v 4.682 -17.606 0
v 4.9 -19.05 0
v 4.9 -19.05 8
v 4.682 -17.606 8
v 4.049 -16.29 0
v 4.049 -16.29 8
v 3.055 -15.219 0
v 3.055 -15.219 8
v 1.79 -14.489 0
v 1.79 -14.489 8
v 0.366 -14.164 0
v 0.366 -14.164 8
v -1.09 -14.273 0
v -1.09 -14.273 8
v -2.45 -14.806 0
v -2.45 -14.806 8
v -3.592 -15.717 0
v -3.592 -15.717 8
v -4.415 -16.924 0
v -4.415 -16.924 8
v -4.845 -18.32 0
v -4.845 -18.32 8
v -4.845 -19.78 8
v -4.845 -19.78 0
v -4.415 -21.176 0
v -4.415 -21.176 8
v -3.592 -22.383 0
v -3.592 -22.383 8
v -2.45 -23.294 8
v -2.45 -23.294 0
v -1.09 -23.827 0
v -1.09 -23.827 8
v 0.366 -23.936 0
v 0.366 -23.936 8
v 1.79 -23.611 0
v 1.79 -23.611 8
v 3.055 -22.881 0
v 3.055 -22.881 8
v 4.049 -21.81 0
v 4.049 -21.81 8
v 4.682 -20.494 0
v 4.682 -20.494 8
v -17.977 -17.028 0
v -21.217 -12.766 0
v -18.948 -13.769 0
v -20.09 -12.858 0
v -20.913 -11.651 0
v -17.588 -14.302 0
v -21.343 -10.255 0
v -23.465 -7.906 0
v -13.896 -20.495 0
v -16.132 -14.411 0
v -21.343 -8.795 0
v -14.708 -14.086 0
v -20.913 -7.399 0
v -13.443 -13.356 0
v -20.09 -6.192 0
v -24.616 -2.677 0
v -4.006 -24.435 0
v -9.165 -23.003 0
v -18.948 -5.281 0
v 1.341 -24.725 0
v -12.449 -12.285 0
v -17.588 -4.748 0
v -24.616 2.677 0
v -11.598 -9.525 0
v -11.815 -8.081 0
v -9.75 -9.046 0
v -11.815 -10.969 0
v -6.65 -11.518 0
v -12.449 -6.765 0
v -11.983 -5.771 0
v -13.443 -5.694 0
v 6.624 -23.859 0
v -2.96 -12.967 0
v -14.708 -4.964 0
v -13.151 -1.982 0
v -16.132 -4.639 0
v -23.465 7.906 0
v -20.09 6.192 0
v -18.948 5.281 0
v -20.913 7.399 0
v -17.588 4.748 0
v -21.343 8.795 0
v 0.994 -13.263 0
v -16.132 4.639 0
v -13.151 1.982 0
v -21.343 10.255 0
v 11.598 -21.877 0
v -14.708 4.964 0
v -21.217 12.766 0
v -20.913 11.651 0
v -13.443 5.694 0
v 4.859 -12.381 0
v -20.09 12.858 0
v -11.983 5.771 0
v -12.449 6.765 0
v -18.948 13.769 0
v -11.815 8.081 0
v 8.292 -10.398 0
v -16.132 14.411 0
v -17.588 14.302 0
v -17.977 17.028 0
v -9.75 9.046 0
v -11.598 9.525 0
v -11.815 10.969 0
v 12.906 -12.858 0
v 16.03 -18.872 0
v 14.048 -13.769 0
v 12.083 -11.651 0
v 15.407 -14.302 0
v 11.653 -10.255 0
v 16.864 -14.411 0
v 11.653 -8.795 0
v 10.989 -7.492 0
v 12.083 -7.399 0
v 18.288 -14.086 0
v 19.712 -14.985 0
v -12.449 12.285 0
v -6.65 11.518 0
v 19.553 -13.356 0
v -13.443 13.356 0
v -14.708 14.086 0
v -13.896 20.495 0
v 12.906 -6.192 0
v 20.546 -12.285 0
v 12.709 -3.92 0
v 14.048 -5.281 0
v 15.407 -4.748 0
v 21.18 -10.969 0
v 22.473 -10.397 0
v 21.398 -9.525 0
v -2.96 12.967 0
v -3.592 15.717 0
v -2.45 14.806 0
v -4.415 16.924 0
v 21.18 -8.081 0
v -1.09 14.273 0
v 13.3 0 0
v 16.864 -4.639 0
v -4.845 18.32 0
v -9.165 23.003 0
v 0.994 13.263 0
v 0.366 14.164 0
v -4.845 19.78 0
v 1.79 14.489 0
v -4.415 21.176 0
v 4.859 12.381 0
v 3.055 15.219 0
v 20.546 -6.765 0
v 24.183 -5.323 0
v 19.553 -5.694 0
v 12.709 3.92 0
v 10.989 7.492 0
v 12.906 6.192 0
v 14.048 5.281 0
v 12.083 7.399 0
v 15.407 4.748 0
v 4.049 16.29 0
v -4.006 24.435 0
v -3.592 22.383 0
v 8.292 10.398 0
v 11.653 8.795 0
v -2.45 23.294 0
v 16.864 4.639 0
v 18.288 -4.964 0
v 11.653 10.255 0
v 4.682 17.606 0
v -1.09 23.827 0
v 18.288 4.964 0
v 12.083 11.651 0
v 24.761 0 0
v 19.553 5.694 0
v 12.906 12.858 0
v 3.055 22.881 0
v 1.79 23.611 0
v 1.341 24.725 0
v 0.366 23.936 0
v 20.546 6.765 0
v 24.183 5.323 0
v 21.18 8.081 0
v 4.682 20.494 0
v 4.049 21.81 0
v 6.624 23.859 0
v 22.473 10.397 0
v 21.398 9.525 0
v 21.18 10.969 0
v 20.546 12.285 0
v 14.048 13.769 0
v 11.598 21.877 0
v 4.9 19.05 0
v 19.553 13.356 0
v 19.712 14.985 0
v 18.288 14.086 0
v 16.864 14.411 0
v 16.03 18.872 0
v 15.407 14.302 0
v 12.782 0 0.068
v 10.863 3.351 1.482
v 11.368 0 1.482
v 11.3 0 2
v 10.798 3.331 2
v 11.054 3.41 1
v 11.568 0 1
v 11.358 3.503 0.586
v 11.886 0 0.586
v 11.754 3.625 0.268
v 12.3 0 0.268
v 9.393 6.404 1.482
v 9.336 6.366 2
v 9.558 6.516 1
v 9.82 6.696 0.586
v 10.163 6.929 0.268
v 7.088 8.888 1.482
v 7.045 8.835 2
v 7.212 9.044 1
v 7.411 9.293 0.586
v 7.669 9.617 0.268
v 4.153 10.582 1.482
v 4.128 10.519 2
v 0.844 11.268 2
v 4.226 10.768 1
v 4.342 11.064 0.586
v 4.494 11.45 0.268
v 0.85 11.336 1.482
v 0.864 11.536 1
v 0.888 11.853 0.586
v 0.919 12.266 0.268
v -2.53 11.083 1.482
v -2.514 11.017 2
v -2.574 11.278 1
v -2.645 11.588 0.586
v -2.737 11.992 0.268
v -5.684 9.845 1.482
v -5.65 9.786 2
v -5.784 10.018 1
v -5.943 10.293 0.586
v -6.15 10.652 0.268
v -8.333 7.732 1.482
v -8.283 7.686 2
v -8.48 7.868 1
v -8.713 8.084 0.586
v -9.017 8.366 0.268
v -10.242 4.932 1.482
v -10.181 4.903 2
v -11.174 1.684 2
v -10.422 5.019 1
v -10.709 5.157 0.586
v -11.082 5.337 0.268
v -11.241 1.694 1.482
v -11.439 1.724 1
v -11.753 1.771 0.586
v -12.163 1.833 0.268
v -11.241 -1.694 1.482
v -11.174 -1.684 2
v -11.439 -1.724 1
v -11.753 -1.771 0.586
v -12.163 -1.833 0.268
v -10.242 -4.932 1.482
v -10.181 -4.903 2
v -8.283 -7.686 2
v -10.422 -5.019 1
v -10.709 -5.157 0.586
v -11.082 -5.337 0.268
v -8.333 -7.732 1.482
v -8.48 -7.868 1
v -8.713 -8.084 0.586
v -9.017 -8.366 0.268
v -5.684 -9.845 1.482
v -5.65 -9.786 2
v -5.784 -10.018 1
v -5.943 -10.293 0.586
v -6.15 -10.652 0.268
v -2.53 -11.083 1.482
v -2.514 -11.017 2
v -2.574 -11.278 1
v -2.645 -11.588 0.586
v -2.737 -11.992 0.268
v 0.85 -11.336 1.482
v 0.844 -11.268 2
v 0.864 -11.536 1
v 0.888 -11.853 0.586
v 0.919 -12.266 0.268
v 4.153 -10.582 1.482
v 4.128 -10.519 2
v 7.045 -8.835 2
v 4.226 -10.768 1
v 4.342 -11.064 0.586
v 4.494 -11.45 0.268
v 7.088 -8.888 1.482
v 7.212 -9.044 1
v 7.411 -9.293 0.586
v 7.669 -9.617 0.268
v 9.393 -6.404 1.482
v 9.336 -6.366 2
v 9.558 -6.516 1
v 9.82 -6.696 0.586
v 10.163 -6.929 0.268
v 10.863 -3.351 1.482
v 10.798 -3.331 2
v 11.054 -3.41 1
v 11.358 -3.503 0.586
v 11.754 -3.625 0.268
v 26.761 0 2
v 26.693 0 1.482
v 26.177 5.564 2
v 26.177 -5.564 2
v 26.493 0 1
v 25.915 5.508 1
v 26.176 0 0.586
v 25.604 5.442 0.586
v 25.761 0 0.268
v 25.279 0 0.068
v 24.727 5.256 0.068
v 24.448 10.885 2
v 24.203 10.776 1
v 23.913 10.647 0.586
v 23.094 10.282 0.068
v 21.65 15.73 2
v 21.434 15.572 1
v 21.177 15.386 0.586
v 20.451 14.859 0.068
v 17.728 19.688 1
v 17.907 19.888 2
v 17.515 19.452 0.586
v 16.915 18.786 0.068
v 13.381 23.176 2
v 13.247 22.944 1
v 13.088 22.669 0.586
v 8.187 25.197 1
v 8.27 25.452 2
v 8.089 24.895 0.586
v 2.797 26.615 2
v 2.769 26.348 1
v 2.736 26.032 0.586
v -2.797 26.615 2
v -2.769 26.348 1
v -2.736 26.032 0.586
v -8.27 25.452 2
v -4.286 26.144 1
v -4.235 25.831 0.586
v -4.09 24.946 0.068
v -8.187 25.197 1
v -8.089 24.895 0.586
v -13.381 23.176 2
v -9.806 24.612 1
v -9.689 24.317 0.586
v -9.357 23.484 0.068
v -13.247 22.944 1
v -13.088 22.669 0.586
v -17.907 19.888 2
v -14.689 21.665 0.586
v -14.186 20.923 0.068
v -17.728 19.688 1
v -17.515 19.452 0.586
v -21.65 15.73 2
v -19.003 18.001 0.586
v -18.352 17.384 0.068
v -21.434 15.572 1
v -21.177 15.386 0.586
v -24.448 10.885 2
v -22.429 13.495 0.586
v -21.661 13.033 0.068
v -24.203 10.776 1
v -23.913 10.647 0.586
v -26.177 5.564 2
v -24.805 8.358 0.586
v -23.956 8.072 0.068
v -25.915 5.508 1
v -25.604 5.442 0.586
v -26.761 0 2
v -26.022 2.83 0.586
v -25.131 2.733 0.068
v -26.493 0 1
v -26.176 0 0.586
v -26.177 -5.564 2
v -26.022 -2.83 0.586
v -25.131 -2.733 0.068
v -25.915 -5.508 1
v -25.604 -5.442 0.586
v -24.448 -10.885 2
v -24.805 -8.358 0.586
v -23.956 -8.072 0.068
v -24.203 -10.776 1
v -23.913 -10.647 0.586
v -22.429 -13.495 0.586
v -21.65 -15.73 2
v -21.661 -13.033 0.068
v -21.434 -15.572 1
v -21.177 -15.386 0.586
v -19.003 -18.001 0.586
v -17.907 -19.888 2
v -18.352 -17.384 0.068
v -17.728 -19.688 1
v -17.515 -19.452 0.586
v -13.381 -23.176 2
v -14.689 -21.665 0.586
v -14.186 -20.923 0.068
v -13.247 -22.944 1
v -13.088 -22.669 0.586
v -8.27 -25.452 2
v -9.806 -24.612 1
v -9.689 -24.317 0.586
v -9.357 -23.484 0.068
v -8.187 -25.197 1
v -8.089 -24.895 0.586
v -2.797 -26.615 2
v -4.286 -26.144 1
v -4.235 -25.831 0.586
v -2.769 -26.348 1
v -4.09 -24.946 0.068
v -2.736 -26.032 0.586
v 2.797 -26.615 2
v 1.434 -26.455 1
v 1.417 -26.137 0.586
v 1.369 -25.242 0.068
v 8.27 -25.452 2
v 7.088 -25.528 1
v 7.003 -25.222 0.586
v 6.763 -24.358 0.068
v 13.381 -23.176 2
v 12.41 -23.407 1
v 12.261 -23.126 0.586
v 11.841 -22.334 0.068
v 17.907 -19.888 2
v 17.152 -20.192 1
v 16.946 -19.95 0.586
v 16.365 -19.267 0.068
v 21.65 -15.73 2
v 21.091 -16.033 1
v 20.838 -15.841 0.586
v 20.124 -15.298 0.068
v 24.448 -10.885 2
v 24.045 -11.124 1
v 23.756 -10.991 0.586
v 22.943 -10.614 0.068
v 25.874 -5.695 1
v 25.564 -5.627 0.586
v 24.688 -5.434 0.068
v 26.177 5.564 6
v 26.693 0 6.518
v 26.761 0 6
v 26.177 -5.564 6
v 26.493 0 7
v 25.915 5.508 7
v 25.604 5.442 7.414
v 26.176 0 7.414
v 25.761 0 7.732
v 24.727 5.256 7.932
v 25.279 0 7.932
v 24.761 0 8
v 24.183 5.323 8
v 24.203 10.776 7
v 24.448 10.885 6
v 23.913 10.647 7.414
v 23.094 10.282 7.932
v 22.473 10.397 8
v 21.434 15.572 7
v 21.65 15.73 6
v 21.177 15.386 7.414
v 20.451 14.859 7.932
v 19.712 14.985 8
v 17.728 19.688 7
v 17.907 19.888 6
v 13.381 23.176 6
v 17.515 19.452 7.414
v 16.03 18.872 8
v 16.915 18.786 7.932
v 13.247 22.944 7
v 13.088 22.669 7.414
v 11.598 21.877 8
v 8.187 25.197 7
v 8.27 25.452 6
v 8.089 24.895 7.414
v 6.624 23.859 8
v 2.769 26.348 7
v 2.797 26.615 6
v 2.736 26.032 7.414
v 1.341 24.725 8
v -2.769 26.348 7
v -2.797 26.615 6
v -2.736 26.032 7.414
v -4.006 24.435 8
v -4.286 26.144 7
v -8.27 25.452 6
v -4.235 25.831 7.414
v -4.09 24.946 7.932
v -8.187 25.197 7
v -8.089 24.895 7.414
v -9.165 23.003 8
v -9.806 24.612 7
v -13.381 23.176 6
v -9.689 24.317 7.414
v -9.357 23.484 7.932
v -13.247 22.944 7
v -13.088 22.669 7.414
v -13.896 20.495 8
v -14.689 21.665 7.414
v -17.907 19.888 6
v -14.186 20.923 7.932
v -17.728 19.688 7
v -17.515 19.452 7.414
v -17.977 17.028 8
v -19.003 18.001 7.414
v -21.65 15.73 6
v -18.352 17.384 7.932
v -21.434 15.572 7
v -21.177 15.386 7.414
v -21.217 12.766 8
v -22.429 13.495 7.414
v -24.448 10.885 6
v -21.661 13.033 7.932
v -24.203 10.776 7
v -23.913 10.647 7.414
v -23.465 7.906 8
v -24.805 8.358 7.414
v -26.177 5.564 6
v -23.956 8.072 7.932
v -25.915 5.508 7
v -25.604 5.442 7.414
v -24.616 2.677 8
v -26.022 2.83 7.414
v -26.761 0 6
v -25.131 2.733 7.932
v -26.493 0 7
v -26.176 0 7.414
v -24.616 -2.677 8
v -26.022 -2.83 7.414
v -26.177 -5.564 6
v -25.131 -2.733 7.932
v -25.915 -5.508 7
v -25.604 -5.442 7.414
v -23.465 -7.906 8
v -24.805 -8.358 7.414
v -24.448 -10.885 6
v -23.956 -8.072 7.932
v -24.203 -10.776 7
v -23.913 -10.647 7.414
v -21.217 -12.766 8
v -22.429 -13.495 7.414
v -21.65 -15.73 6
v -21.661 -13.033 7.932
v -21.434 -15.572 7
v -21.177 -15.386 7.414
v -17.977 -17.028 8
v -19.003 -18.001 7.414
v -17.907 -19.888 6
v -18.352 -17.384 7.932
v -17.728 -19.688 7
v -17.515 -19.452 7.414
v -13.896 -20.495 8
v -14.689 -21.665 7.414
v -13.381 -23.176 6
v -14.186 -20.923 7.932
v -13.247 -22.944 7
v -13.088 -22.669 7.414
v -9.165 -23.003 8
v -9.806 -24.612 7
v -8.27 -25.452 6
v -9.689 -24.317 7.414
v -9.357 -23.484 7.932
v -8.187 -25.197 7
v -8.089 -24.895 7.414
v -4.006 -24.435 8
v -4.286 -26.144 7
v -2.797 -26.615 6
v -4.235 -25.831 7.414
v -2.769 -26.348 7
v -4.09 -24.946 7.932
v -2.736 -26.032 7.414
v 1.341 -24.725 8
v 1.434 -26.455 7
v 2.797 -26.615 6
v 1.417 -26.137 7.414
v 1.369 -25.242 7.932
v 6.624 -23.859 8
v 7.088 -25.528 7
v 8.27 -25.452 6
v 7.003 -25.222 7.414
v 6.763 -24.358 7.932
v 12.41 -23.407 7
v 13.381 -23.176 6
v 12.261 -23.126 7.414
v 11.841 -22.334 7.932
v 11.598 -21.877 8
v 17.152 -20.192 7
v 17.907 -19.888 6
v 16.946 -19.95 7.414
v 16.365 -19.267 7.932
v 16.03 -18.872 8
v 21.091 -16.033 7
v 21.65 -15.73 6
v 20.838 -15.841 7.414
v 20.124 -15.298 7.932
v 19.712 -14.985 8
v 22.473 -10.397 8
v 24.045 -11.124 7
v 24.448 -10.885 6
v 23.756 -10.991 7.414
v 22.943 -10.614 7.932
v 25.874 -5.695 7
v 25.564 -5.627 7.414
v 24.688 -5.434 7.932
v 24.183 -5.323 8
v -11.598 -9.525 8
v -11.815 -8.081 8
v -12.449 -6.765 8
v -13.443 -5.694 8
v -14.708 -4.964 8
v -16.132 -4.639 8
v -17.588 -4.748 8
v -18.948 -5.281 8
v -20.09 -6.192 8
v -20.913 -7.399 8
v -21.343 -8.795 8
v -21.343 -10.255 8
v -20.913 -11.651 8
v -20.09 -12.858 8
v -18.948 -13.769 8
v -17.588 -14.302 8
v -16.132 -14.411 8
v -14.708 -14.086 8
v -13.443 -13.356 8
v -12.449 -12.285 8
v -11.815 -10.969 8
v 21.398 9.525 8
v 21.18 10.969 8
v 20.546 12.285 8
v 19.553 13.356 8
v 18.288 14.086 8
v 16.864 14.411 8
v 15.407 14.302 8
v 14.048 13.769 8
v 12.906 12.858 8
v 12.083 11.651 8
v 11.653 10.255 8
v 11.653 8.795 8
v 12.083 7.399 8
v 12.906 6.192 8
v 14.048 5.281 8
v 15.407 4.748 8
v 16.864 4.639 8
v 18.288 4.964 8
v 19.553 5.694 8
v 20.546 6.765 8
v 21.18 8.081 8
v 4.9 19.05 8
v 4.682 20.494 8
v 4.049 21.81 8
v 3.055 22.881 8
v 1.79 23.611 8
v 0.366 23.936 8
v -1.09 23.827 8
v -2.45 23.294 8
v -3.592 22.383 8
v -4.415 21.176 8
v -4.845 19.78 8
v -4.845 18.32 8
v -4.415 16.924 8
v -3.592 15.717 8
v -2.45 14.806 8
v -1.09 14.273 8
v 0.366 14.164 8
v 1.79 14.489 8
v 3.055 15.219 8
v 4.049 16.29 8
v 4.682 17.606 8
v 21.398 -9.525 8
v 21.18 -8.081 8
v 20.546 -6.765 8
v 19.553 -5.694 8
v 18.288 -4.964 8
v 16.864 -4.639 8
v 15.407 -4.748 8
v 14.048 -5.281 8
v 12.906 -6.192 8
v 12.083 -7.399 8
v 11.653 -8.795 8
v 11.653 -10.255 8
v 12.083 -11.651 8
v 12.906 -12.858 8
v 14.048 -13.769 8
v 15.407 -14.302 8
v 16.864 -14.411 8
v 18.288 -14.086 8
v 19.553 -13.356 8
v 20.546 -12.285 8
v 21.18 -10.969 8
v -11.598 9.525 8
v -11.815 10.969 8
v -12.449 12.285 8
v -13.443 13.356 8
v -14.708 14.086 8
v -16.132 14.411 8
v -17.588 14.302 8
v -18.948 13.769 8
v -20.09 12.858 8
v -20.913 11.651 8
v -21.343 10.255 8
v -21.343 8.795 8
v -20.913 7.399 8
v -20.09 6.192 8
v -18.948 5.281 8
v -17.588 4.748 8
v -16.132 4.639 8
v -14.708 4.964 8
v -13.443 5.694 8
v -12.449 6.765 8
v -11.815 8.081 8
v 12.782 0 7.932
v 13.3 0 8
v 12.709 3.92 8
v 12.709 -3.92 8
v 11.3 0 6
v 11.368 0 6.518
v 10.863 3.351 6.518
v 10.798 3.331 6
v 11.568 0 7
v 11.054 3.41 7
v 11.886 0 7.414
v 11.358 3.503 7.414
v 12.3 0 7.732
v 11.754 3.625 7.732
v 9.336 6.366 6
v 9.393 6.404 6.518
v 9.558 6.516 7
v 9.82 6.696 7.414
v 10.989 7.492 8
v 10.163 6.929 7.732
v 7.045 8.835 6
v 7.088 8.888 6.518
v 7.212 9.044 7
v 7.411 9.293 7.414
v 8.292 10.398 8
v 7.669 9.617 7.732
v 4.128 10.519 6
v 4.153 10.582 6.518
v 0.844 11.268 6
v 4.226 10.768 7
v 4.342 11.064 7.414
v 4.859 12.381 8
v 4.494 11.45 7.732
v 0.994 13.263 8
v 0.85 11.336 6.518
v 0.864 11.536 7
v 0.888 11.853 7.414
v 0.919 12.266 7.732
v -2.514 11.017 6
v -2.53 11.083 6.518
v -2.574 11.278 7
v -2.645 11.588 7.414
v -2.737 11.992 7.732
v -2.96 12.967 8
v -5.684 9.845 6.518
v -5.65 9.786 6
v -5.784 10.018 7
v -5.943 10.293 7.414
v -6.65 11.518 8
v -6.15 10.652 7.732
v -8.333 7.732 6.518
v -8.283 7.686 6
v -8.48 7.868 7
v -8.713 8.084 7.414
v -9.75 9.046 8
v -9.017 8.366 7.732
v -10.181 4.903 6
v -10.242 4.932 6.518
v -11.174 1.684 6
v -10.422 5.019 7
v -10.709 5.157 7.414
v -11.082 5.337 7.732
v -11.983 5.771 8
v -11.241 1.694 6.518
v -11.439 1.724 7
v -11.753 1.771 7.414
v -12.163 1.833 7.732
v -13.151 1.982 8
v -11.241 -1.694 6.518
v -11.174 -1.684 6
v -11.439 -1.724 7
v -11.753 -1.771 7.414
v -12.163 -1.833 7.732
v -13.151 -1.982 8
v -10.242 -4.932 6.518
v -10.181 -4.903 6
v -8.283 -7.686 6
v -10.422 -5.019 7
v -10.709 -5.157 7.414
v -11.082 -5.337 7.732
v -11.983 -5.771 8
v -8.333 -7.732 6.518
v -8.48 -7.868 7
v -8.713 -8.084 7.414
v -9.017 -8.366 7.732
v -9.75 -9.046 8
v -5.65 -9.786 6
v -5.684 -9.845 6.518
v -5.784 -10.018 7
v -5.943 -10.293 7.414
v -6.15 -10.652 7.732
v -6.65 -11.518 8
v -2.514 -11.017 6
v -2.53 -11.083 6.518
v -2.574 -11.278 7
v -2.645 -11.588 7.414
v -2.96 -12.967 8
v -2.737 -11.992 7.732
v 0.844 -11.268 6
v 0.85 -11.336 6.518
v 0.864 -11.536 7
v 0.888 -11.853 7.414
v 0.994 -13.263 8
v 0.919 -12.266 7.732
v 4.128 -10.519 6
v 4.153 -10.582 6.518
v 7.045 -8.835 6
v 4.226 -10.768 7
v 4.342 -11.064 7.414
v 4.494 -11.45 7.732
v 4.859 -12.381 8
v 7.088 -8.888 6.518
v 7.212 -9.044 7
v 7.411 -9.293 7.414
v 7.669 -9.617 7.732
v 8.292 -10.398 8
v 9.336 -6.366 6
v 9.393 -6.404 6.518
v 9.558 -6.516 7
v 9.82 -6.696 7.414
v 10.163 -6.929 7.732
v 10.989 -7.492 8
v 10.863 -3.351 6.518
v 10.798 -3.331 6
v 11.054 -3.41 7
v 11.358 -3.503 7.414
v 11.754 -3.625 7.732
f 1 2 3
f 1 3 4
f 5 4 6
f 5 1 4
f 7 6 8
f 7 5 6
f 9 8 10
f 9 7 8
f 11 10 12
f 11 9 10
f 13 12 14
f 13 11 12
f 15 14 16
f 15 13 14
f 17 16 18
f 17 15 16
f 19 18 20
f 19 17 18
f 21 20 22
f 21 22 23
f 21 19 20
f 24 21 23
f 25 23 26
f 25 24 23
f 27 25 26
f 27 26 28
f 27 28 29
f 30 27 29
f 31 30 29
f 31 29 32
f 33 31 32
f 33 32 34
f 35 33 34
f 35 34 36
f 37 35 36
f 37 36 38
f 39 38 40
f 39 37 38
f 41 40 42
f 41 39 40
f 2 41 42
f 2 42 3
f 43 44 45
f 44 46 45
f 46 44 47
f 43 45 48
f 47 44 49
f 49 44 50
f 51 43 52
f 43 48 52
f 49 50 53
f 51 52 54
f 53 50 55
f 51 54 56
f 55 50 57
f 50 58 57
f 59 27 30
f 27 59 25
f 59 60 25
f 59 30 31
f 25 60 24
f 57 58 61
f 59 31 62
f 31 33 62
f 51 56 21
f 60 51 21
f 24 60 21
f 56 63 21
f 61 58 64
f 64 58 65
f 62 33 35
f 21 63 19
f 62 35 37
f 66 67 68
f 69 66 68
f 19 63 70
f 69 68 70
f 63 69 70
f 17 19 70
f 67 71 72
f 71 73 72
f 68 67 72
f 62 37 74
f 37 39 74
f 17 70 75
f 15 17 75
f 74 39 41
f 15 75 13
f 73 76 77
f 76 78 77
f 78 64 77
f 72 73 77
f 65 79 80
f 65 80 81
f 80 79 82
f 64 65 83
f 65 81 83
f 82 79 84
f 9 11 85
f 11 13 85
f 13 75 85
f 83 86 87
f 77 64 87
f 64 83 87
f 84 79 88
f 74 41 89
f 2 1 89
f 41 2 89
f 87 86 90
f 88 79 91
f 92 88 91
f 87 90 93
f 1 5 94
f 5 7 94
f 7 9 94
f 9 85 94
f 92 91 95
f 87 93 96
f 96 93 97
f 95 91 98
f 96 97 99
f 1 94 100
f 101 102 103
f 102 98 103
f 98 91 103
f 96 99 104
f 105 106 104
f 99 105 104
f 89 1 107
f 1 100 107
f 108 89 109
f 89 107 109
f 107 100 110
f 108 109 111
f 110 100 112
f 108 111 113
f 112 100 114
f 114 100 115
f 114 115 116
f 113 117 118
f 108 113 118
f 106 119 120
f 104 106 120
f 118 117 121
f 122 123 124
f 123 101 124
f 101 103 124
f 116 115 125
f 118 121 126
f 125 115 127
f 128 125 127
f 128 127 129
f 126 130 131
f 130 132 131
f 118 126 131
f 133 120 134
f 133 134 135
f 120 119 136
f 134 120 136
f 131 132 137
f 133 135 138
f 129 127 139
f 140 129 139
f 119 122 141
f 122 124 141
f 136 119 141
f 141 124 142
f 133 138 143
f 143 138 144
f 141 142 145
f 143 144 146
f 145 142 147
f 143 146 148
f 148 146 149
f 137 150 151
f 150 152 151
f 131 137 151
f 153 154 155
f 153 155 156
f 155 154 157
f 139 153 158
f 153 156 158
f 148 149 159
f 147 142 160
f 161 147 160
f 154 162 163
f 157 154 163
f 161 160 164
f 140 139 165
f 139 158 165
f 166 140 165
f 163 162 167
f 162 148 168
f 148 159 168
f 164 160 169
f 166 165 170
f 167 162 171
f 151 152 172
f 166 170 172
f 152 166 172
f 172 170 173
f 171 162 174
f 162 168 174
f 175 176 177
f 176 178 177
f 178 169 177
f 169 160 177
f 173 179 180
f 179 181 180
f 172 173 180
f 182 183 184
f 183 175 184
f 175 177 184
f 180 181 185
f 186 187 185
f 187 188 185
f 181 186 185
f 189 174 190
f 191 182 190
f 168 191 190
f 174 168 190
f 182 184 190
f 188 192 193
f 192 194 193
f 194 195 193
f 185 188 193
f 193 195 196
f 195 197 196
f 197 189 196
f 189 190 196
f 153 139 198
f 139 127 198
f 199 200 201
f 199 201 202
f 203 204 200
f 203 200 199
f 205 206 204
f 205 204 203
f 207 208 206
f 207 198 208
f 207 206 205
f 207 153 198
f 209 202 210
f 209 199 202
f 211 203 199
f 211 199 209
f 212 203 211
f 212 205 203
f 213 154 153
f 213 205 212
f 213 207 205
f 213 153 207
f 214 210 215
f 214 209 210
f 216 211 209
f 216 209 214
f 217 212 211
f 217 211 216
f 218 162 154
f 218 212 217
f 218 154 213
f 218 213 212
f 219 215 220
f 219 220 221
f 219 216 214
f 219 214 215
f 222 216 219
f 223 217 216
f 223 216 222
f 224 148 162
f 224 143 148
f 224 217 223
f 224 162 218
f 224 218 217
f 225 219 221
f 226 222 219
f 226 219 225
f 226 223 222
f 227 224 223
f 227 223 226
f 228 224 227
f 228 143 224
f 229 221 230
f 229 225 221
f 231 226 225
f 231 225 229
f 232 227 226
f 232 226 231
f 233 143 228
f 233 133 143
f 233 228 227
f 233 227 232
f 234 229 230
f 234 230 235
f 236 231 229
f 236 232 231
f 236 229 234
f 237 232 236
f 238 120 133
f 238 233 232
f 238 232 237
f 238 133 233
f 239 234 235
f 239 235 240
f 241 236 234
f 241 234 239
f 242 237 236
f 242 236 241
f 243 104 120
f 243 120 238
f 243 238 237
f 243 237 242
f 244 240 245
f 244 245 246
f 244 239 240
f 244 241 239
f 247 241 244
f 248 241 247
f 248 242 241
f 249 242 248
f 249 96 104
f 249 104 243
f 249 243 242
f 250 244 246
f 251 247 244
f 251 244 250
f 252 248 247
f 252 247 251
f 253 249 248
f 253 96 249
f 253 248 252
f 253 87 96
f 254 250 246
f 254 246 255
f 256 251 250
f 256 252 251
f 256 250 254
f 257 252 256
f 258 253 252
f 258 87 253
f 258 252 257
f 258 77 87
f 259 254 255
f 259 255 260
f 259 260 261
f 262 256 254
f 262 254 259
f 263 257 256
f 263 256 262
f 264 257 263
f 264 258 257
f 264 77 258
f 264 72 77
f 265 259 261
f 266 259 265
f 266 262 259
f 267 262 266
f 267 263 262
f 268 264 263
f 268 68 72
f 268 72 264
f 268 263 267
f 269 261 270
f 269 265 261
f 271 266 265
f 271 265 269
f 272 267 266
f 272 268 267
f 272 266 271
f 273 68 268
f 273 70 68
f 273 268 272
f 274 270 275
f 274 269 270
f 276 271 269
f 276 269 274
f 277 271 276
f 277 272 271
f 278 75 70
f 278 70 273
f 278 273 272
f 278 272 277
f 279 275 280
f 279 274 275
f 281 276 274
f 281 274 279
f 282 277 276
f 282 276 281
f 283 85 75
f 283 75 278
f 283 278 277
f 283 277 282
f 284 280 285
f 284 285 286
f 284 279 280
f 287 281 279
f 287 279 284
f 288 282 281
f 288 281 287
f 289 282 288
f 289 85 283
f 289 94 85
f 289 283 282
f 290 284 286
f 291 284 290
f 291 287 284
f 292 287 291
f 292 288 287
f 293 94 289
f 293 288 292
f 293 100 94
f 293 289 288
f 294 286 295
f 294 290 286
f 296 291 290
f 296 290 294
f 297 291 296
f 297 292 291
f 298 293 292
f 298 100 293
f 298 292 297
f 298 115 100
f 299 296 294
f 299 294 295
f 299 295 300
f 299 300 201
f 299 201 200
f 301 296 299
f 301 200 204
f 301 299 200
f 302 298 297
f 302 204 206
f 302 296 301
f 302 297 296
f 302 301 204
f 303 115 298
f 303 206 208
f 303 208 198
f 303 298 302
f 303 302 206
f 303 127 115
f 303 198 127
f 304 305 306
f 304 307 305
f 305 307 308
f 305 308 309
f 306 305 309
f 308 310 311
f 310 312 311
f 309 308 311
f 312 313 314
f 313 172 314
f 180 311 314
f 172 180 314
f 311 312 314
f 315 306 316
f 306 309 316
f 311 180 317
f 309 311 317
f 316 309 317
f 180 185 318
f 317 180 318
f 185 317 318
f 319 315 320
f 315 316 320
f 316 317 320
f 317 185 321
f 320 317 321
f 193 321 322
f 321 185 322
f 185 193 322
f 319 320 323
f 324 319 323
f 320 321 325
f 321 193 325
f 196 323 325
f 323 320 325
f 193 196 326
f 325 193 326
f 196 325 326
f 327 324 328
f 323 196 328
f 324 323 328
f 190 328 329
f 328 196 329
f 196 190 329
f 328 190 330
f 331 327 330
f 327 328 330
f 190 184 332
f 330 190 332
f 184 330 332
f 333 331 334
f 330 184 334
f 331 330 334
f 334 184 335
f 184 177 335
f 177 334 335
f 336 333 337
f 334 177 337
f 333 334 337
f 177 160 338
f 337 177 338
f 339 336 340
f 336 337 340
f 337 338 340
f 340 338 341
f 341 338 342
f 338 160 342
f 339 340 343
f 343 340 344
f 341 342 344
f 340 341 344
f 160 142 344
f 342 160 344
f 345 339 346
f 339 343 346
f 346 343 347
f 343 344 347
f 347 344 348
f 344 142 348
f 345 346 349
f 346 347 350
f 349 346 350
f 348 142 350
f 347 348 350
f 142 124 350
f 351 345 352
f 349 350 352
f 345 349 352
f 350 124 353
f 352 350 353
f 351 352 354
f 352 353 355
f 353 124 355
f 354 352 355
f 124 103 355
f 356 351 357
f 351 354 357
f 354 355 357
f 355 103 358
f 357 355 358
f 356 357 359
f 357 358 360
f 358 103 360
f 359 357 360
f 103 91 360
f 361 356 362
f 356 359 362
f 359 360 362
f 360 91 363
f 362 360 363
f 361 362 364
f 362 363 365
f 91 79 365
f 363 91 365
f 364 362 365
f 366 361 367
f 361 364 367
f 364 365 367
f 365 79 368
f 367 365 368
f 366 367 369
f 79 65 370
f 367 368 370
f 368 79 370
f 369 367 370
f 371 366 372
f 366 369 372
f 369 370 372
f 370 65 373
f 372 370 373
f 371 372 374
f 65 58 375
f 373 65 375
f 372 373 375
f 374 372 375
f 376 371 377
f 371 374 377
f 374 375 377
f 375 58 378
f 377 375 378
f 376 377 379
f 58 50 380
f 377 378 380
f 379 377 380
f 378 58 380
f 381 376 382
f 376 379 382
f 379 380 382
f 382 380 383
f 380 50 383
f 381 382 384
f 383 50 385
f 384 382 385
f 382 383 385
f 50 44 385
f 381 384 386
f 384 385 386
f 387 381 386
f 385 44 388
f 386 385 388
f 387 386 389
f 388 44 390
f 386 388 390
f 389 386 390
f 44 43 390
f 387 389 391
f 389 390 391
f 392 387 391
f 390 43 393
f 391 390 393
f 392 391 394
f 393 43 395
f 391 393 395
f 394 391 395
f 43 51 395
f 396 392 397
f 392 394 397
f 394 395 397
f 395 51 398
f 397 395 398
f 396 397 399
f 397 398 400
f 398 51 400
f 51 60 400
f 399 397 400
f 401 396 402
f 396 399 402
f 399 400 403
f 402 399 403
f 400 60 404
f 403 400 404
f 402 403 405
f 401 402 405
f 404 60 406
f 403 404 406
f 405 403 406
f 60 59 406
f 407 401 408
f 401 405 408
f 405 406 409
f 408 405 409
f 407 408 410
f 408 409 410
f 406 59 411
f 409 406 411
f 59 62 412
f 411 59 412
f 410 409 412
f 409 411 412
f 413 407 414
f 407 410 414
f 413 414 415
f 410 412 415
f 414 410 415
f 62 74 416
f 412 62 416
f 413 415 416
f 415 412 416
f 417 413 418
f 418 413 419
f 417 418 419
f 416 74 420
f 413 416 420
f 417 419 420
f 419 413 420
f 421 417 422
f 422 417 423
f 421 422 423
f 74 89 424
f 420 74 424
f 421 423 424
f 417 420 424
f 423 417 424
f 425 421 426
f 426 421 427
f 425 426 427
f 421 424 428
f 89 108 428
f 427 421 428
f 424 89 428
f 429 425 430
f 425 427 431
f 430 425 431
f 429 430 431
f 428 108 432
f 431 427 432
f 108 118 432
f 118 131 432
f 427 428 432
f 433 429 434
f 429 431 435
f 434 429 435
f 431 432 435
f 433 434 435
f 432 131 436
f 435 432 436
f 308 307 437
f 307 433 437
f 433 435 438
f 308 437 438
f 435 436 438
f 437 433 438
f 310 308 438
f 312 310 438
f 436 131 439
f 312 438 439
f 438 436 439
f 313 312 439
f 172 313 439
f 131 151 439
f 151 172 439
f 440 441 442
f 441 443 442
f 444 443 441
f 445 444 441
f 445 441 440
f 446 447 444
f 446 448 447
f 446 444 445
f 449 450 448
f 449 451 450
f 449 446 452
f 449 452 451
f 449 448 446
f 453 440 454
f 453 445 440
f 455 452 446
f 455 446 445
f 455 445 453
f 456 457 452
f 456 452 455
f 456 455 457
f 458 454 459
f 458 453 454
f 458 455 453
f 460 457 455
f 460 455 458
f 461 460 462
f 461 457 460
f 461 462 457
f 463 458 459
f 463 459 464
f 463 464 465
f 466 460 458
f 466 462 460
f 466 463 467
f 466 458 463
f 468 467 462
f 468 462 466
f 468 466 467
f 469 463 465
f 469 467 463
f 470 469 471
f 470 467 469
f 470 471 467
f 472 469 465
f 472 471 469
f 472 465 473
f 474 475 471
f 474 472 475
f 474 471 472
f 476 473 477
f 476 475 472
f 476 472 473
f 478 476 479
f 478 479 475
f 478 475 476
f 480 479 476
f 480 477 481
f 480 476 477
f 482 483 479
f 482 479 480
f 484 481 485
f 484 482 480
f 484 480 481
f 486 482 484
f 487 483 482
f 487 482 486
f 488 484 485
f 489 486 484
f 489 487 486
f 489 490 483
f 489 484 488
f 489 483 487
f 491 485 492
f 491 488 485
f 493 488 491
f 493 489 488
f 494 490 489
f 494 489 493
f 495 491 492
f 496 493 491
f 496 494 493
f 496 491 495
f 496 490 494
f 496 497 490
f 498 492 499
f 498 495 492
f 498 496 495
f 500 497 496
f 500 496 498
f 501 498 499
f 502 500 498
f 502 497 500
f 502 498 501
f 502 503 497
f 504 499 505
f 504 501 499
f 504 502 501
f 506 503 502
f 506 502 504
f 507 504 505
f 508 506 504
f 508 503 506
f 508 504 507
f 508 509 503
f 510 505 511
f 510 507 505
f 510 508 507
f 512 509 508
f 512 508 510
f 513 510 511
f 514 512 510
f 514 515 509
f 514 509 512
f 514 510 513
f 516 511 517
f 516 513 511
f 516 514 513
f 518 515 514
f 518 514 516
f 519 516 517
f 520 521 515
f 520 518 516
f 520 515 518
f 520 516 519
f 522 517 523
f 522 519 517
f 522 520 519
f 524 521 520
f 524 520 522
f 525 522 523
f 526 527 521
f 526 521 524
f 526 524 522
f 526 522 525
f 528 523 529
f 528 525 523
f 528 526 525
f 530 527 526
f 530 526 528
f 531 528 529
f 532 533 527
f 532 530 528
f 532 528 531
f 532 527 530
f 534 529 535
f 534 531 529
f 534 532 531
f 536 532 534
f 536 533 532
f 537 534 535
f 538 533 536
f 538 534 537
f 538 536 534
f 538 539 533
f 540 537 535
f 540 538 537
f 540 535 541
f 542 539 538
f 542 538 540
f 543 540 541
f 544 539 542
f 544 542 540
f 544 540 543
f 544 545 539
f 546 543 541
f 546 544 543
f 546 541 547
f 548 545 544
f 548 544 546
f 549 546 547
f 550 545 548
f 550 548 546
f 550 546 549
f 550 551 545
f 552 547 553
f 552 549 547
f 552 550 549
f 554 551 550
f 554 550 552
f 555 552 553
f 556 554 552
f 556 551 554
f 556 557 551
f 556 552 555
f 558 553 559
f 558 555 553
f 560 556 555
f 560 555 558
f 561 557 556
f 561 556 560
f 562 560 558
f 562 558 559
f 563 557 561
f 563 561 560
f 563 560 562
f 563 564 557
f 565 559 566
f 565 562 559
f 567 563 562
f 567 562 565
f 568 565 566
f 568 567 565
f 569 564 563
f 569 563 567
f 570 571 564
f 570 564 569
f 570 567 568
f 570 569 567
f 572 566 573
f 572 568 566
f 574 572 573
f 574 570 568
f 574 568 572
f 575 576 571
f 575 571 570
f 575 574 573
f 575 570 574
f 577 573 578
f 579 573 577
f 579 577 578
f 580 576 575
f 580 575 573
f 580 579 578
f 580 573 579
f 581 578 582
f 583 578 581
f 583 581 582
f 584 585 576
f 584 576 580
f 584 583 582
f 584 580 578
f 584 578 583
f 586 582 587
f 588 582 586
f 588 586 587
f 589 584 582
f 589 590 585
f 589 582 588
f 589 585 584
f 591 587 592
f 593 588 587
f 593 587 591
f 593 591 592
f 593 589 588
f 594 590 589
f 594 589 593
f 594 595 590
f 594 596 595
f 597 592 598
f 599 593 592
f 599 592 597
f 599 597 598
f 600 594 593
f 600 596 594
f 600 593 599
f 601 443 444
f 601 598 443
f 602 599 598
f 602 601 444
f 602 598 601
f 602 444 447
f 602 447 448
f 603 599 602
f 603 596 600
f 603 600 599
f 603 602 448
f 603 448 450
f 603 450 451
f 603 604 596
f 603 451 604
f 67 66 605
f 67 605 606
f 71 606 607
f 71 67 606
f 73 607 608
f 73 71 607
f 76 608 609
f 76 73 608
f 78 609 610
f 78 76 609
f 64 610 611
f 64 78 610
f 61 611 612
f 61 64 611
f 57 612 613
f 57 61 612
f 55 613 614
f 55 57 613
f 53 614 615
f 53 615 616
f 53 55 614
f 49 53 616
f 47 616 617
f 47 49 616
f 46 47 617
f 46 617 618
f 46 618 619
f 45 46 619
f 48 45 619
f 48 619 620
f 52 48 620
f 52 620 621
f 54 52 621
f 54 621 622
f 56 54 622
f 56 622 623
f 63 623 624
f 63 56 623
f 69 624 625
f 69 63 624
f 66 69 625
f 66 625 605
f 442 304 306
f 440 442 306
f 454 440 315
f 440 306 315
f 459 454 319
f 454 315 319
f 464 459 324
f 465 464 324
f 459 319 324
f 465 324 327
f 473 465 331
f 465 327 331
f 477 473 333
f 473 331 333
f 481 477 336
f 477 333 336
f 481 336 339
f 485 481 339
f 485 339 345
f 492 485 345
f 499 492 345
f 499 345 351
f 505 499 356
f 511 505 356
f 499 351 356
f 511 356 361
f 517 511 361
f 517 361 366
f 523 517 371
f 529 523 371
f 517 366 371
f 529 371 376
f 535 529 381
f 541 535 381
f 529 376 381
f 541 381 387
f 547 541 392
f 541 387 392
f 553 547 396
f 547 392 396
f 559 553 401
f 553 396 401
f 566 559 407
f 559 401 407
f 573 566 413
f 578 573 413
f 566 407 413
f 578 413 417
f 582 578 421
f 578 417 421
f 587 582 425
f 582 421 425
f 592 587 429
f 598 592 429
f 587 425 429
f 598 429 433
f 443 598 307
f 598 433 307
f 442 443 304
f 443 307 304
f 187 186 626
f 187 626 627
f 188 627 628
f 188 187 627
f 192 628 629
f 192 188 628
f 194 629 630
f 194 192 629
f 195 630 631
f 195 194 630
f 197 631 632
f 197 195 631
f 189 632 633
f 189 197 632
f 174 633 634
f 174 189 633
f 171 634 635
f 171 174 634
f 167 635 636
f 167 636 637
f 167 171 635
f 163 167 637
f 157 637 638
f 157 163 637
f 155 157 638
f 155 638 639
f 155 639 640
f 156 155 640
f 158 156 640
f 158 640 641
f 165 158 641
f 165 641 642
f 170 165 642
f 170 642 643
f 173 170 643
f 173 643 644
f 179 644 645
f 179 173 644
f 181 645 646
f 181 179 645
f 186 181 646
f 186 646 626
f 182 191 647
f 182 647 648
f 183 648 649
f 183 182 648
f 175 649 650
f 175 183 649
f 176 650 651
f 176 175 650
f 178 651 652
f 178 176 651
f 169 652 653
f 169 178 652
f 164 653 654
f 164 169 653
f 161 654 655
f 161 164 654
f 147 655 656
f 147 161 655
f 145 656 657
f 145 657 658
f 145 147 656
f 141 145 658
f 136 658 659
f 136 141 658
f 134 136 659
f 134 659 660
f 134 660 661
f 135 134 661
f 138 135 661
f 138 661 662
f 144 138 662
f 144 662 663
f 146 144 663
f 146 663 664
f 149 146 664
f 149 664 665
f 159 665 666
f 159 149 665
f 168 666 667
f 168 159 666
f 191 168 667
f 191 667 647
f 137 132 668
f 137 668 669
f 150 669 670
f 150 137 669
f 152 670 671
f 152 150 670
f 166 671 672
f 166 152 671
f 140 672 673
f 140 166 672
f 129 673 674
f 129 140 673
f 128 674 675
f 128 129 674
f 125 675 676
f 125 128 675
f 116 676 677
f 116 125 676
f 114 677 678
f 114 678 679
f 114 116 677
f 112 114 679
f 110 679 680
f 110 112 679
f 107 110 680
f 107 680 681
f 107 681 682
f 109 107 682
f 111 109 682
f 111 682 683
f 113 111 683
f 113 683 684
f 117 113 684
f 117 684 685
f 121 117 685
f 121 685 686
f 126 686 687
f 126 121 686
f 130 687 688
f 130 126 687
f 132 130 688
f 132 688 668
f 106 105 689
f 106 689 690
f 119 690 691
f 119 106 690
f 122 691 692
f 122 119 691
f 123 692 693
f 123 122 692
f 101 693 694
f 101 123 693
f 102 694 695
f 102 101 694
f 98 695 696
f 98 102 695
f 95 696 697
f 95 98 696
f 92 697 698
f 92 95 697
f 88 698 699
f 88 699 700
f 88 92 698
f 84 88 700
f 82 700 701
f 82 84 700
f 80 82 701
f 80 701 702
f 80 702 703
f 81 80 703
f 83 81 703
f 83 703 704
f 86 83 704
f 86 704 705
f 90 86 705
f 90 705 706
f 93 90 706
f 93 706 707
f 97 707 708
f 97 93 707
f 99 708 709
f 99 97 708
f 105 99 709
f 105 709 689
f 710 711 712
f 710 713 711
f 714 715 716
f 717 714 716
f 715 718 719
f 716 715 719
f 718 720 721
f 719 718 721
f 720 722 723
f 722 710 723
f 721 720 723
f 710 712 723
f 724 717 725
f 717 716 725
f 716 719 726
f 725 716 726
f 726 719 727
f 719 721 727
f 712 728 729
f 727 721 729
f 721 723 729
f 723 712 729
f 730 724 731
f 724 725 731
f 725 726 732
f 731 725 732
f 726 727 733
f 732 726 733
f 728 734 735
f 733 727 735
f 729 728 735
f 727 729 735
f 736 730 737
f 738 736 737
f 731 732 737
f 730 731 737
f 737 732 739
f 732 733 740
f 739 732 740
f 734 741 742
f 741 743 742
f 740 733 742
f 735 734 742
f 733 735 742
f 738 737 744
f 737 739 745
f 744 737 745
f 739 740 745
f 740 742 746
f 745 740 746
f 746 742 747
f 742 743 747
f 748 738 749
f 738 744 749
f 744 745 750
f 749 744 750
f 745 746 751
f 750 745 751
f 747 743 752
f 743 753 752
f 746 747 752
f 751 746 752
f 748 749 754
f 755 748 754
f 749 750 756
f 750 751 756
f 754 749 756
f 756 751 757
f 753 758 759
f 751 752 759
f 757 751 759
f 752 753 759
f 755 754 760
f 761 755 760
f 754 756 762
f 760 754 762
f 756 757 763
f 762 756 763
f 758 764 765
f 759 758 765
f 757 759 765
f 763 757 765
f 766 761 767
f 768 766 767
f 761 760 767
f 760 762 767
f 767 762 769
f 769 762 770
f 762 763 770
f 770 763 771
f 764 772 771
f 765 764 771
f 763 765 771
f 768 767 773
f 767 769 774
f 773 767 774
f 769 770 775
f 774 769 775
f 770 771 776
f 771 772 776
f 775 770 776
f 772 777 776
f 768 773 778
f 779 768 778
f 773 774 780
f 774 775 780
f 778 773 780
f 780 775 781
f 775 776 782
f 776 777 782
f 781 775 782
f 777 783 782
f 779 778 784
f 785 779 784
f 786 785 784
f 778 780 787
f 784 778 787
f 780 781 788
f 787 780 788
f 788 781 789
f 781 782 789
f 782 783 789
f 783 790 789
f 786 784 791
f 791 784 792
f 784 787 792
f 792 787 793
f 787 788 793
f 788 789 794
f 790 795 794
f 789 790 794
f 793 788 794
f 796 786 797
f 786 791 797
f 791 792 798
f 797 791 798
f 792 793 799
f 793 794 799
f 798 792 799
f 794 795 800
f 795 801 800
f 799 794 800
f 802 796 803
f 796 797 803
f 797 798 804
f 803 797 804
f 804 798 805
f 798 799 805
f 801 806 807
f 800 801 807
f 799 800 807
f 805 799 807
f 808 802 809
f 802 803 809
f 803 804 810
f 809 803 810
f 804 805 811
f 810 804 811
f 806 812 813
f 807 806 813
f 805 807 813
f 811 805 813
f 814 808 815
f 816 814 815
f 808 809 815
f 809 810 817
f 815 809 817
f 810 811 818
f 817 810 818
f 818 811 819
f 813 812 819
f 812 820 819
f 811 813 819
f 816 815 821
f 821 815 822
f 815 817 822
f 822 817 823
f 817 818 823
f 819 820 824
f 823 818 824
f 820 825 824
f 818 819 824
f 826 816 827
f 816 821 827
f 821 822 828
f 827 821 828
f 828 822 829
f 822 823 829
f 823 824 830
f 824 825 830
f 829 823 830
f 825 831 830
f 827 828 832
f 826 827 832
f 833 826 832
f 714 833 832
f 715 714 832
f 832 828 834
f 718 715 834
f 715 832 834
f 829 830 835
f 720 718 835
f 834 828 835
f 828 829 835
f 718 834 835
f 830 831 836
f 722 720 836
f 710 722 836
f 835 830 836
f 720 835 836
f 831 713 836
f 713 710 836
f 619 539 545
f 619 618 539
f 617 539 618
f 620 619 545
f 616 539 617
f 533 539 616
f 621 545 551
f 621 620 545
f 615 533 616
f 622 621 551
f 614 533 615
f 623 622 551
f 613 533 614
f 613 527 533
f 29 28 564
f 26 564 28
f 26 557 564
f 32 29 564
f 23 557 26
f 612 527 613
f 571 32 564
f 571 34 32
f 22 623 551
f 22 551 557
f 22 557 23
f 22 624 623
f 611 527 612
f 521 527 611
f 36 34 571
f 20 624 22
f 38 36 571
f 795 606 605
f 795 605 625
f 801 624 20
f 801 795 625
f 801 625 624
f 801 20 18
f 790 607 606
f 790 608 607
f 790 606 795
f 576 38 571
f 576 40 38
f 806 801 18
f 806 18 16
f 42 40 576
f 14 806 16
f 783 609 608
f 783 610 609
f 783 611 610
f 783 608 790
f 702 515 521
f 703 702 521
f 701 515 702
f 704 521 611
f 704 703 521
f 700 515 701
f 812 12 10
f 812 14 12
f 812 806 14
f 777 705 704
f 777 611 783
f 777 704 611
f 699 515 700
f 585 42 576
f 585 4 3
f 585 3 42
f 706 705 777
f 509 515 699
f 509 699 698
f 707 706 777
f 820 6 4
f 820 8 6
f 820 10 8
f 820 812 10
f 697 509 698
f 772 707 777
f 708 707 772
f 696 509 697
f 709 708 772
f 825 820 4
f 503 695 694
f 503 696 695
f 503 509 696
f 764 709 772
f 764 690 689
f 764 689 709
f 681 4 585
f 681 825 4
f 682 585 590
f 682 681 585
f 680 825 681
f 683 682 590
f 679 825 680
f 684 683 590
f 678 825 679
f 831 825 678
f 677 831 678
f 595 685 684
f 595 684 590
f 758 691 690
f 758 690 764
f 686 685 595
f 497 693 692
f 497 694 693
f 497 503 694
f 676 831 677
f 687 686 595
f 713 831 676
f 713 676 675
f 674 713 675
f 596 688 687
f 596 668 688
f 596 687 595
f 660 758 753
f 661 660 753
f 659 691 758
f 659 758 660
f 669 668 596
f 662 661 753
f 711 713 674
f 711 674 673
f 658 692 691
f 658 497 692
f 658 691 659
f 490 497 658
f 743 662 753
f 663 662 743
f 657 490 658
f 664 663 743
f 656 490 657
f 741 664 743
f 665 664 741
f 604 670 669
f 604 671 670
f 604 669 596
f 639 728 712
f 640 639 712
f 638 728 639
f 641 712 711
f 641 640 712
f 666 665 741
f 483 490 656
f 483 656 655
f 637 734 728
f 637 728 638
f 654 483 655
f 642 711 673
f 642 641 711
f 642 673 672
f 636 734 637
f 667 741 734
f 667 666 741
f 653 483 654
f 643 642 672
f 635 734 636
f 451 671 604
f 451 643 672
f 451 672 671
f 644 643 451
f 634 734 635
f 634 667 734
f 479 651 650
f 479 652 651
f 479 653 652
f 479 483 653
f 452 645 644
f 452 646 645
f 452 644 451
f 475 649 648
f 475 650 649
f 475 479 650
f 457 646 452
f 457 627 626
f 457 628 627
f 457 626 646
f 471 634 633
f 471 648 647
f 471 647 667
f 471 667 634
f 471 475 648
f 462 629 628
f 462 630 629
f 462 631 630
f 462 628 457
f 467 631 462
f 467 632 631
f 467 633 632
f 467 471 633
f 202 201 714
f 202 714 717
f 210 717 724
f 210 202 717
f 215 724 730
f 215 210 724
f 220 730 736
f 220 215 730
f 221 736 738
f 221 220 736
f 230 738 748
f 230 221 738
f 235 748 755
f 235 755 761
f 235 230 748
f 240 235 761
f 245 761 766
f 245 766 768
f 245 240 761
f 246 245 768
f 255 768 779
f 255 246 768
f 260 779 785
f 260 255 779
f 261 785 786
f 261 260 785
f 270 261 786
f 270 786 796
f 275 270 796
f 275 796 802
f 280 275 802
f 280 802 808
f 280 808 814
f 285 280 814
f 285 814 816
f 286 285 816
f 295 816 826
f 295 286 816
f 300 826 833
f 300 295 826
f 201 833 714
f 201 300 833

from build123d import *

# Parameters (mm, degrees)
F0_R     = 26.761417
F0_R_2   = 4.9
F0_R_3   = 11.3
F1_DEPTH = 8
F2_R     = 2


with BuildPart() as f1:
    # F0 (on Top) → F1 (new body)
    with BuildSketch(Plane.XY):
        Circle(F0_R)
        with Locations((-16.497784, -9.525)):
            Circle(F0_R_2, mode=Mode.SUBTRACT)
        with Locations((0, -19.05)):
            Circle(F0_R_2, mode=Mode.SUBTRACT)
        with Locations((16.497784, -9.525)):
            Circle(F0_R_2, mode=Mode.SUBTRACT)
        with Locations((-16.497784, 9.525)):
            Circle(F0_R_2, mode=Mode.SUBTRACT)
        Circle(F0_R_3, mode=Mode.SUBTRACT)
        with Locations((16.497784, 9.525)):
            Circle(F0_R_2, mode=Mode.SUBTRACT)
        with Locations((0, 19.05)):
            Circle(F0_R_2, mode=Mode.SUBTRACT)
    extrude(amount=F1_DEPTH)

    # F2
    f2_edges = [f1.edges().sort_by_distance(p)[0] for p in [
        (-11.3, 0, 8),
        (-11.3, 0, 0),
        (-26.761417, 0, 0),
        (-26.761417, 0, 8),
    ]]
    fillet(f2_edges, radius=F2_R)


solid = f1.part
